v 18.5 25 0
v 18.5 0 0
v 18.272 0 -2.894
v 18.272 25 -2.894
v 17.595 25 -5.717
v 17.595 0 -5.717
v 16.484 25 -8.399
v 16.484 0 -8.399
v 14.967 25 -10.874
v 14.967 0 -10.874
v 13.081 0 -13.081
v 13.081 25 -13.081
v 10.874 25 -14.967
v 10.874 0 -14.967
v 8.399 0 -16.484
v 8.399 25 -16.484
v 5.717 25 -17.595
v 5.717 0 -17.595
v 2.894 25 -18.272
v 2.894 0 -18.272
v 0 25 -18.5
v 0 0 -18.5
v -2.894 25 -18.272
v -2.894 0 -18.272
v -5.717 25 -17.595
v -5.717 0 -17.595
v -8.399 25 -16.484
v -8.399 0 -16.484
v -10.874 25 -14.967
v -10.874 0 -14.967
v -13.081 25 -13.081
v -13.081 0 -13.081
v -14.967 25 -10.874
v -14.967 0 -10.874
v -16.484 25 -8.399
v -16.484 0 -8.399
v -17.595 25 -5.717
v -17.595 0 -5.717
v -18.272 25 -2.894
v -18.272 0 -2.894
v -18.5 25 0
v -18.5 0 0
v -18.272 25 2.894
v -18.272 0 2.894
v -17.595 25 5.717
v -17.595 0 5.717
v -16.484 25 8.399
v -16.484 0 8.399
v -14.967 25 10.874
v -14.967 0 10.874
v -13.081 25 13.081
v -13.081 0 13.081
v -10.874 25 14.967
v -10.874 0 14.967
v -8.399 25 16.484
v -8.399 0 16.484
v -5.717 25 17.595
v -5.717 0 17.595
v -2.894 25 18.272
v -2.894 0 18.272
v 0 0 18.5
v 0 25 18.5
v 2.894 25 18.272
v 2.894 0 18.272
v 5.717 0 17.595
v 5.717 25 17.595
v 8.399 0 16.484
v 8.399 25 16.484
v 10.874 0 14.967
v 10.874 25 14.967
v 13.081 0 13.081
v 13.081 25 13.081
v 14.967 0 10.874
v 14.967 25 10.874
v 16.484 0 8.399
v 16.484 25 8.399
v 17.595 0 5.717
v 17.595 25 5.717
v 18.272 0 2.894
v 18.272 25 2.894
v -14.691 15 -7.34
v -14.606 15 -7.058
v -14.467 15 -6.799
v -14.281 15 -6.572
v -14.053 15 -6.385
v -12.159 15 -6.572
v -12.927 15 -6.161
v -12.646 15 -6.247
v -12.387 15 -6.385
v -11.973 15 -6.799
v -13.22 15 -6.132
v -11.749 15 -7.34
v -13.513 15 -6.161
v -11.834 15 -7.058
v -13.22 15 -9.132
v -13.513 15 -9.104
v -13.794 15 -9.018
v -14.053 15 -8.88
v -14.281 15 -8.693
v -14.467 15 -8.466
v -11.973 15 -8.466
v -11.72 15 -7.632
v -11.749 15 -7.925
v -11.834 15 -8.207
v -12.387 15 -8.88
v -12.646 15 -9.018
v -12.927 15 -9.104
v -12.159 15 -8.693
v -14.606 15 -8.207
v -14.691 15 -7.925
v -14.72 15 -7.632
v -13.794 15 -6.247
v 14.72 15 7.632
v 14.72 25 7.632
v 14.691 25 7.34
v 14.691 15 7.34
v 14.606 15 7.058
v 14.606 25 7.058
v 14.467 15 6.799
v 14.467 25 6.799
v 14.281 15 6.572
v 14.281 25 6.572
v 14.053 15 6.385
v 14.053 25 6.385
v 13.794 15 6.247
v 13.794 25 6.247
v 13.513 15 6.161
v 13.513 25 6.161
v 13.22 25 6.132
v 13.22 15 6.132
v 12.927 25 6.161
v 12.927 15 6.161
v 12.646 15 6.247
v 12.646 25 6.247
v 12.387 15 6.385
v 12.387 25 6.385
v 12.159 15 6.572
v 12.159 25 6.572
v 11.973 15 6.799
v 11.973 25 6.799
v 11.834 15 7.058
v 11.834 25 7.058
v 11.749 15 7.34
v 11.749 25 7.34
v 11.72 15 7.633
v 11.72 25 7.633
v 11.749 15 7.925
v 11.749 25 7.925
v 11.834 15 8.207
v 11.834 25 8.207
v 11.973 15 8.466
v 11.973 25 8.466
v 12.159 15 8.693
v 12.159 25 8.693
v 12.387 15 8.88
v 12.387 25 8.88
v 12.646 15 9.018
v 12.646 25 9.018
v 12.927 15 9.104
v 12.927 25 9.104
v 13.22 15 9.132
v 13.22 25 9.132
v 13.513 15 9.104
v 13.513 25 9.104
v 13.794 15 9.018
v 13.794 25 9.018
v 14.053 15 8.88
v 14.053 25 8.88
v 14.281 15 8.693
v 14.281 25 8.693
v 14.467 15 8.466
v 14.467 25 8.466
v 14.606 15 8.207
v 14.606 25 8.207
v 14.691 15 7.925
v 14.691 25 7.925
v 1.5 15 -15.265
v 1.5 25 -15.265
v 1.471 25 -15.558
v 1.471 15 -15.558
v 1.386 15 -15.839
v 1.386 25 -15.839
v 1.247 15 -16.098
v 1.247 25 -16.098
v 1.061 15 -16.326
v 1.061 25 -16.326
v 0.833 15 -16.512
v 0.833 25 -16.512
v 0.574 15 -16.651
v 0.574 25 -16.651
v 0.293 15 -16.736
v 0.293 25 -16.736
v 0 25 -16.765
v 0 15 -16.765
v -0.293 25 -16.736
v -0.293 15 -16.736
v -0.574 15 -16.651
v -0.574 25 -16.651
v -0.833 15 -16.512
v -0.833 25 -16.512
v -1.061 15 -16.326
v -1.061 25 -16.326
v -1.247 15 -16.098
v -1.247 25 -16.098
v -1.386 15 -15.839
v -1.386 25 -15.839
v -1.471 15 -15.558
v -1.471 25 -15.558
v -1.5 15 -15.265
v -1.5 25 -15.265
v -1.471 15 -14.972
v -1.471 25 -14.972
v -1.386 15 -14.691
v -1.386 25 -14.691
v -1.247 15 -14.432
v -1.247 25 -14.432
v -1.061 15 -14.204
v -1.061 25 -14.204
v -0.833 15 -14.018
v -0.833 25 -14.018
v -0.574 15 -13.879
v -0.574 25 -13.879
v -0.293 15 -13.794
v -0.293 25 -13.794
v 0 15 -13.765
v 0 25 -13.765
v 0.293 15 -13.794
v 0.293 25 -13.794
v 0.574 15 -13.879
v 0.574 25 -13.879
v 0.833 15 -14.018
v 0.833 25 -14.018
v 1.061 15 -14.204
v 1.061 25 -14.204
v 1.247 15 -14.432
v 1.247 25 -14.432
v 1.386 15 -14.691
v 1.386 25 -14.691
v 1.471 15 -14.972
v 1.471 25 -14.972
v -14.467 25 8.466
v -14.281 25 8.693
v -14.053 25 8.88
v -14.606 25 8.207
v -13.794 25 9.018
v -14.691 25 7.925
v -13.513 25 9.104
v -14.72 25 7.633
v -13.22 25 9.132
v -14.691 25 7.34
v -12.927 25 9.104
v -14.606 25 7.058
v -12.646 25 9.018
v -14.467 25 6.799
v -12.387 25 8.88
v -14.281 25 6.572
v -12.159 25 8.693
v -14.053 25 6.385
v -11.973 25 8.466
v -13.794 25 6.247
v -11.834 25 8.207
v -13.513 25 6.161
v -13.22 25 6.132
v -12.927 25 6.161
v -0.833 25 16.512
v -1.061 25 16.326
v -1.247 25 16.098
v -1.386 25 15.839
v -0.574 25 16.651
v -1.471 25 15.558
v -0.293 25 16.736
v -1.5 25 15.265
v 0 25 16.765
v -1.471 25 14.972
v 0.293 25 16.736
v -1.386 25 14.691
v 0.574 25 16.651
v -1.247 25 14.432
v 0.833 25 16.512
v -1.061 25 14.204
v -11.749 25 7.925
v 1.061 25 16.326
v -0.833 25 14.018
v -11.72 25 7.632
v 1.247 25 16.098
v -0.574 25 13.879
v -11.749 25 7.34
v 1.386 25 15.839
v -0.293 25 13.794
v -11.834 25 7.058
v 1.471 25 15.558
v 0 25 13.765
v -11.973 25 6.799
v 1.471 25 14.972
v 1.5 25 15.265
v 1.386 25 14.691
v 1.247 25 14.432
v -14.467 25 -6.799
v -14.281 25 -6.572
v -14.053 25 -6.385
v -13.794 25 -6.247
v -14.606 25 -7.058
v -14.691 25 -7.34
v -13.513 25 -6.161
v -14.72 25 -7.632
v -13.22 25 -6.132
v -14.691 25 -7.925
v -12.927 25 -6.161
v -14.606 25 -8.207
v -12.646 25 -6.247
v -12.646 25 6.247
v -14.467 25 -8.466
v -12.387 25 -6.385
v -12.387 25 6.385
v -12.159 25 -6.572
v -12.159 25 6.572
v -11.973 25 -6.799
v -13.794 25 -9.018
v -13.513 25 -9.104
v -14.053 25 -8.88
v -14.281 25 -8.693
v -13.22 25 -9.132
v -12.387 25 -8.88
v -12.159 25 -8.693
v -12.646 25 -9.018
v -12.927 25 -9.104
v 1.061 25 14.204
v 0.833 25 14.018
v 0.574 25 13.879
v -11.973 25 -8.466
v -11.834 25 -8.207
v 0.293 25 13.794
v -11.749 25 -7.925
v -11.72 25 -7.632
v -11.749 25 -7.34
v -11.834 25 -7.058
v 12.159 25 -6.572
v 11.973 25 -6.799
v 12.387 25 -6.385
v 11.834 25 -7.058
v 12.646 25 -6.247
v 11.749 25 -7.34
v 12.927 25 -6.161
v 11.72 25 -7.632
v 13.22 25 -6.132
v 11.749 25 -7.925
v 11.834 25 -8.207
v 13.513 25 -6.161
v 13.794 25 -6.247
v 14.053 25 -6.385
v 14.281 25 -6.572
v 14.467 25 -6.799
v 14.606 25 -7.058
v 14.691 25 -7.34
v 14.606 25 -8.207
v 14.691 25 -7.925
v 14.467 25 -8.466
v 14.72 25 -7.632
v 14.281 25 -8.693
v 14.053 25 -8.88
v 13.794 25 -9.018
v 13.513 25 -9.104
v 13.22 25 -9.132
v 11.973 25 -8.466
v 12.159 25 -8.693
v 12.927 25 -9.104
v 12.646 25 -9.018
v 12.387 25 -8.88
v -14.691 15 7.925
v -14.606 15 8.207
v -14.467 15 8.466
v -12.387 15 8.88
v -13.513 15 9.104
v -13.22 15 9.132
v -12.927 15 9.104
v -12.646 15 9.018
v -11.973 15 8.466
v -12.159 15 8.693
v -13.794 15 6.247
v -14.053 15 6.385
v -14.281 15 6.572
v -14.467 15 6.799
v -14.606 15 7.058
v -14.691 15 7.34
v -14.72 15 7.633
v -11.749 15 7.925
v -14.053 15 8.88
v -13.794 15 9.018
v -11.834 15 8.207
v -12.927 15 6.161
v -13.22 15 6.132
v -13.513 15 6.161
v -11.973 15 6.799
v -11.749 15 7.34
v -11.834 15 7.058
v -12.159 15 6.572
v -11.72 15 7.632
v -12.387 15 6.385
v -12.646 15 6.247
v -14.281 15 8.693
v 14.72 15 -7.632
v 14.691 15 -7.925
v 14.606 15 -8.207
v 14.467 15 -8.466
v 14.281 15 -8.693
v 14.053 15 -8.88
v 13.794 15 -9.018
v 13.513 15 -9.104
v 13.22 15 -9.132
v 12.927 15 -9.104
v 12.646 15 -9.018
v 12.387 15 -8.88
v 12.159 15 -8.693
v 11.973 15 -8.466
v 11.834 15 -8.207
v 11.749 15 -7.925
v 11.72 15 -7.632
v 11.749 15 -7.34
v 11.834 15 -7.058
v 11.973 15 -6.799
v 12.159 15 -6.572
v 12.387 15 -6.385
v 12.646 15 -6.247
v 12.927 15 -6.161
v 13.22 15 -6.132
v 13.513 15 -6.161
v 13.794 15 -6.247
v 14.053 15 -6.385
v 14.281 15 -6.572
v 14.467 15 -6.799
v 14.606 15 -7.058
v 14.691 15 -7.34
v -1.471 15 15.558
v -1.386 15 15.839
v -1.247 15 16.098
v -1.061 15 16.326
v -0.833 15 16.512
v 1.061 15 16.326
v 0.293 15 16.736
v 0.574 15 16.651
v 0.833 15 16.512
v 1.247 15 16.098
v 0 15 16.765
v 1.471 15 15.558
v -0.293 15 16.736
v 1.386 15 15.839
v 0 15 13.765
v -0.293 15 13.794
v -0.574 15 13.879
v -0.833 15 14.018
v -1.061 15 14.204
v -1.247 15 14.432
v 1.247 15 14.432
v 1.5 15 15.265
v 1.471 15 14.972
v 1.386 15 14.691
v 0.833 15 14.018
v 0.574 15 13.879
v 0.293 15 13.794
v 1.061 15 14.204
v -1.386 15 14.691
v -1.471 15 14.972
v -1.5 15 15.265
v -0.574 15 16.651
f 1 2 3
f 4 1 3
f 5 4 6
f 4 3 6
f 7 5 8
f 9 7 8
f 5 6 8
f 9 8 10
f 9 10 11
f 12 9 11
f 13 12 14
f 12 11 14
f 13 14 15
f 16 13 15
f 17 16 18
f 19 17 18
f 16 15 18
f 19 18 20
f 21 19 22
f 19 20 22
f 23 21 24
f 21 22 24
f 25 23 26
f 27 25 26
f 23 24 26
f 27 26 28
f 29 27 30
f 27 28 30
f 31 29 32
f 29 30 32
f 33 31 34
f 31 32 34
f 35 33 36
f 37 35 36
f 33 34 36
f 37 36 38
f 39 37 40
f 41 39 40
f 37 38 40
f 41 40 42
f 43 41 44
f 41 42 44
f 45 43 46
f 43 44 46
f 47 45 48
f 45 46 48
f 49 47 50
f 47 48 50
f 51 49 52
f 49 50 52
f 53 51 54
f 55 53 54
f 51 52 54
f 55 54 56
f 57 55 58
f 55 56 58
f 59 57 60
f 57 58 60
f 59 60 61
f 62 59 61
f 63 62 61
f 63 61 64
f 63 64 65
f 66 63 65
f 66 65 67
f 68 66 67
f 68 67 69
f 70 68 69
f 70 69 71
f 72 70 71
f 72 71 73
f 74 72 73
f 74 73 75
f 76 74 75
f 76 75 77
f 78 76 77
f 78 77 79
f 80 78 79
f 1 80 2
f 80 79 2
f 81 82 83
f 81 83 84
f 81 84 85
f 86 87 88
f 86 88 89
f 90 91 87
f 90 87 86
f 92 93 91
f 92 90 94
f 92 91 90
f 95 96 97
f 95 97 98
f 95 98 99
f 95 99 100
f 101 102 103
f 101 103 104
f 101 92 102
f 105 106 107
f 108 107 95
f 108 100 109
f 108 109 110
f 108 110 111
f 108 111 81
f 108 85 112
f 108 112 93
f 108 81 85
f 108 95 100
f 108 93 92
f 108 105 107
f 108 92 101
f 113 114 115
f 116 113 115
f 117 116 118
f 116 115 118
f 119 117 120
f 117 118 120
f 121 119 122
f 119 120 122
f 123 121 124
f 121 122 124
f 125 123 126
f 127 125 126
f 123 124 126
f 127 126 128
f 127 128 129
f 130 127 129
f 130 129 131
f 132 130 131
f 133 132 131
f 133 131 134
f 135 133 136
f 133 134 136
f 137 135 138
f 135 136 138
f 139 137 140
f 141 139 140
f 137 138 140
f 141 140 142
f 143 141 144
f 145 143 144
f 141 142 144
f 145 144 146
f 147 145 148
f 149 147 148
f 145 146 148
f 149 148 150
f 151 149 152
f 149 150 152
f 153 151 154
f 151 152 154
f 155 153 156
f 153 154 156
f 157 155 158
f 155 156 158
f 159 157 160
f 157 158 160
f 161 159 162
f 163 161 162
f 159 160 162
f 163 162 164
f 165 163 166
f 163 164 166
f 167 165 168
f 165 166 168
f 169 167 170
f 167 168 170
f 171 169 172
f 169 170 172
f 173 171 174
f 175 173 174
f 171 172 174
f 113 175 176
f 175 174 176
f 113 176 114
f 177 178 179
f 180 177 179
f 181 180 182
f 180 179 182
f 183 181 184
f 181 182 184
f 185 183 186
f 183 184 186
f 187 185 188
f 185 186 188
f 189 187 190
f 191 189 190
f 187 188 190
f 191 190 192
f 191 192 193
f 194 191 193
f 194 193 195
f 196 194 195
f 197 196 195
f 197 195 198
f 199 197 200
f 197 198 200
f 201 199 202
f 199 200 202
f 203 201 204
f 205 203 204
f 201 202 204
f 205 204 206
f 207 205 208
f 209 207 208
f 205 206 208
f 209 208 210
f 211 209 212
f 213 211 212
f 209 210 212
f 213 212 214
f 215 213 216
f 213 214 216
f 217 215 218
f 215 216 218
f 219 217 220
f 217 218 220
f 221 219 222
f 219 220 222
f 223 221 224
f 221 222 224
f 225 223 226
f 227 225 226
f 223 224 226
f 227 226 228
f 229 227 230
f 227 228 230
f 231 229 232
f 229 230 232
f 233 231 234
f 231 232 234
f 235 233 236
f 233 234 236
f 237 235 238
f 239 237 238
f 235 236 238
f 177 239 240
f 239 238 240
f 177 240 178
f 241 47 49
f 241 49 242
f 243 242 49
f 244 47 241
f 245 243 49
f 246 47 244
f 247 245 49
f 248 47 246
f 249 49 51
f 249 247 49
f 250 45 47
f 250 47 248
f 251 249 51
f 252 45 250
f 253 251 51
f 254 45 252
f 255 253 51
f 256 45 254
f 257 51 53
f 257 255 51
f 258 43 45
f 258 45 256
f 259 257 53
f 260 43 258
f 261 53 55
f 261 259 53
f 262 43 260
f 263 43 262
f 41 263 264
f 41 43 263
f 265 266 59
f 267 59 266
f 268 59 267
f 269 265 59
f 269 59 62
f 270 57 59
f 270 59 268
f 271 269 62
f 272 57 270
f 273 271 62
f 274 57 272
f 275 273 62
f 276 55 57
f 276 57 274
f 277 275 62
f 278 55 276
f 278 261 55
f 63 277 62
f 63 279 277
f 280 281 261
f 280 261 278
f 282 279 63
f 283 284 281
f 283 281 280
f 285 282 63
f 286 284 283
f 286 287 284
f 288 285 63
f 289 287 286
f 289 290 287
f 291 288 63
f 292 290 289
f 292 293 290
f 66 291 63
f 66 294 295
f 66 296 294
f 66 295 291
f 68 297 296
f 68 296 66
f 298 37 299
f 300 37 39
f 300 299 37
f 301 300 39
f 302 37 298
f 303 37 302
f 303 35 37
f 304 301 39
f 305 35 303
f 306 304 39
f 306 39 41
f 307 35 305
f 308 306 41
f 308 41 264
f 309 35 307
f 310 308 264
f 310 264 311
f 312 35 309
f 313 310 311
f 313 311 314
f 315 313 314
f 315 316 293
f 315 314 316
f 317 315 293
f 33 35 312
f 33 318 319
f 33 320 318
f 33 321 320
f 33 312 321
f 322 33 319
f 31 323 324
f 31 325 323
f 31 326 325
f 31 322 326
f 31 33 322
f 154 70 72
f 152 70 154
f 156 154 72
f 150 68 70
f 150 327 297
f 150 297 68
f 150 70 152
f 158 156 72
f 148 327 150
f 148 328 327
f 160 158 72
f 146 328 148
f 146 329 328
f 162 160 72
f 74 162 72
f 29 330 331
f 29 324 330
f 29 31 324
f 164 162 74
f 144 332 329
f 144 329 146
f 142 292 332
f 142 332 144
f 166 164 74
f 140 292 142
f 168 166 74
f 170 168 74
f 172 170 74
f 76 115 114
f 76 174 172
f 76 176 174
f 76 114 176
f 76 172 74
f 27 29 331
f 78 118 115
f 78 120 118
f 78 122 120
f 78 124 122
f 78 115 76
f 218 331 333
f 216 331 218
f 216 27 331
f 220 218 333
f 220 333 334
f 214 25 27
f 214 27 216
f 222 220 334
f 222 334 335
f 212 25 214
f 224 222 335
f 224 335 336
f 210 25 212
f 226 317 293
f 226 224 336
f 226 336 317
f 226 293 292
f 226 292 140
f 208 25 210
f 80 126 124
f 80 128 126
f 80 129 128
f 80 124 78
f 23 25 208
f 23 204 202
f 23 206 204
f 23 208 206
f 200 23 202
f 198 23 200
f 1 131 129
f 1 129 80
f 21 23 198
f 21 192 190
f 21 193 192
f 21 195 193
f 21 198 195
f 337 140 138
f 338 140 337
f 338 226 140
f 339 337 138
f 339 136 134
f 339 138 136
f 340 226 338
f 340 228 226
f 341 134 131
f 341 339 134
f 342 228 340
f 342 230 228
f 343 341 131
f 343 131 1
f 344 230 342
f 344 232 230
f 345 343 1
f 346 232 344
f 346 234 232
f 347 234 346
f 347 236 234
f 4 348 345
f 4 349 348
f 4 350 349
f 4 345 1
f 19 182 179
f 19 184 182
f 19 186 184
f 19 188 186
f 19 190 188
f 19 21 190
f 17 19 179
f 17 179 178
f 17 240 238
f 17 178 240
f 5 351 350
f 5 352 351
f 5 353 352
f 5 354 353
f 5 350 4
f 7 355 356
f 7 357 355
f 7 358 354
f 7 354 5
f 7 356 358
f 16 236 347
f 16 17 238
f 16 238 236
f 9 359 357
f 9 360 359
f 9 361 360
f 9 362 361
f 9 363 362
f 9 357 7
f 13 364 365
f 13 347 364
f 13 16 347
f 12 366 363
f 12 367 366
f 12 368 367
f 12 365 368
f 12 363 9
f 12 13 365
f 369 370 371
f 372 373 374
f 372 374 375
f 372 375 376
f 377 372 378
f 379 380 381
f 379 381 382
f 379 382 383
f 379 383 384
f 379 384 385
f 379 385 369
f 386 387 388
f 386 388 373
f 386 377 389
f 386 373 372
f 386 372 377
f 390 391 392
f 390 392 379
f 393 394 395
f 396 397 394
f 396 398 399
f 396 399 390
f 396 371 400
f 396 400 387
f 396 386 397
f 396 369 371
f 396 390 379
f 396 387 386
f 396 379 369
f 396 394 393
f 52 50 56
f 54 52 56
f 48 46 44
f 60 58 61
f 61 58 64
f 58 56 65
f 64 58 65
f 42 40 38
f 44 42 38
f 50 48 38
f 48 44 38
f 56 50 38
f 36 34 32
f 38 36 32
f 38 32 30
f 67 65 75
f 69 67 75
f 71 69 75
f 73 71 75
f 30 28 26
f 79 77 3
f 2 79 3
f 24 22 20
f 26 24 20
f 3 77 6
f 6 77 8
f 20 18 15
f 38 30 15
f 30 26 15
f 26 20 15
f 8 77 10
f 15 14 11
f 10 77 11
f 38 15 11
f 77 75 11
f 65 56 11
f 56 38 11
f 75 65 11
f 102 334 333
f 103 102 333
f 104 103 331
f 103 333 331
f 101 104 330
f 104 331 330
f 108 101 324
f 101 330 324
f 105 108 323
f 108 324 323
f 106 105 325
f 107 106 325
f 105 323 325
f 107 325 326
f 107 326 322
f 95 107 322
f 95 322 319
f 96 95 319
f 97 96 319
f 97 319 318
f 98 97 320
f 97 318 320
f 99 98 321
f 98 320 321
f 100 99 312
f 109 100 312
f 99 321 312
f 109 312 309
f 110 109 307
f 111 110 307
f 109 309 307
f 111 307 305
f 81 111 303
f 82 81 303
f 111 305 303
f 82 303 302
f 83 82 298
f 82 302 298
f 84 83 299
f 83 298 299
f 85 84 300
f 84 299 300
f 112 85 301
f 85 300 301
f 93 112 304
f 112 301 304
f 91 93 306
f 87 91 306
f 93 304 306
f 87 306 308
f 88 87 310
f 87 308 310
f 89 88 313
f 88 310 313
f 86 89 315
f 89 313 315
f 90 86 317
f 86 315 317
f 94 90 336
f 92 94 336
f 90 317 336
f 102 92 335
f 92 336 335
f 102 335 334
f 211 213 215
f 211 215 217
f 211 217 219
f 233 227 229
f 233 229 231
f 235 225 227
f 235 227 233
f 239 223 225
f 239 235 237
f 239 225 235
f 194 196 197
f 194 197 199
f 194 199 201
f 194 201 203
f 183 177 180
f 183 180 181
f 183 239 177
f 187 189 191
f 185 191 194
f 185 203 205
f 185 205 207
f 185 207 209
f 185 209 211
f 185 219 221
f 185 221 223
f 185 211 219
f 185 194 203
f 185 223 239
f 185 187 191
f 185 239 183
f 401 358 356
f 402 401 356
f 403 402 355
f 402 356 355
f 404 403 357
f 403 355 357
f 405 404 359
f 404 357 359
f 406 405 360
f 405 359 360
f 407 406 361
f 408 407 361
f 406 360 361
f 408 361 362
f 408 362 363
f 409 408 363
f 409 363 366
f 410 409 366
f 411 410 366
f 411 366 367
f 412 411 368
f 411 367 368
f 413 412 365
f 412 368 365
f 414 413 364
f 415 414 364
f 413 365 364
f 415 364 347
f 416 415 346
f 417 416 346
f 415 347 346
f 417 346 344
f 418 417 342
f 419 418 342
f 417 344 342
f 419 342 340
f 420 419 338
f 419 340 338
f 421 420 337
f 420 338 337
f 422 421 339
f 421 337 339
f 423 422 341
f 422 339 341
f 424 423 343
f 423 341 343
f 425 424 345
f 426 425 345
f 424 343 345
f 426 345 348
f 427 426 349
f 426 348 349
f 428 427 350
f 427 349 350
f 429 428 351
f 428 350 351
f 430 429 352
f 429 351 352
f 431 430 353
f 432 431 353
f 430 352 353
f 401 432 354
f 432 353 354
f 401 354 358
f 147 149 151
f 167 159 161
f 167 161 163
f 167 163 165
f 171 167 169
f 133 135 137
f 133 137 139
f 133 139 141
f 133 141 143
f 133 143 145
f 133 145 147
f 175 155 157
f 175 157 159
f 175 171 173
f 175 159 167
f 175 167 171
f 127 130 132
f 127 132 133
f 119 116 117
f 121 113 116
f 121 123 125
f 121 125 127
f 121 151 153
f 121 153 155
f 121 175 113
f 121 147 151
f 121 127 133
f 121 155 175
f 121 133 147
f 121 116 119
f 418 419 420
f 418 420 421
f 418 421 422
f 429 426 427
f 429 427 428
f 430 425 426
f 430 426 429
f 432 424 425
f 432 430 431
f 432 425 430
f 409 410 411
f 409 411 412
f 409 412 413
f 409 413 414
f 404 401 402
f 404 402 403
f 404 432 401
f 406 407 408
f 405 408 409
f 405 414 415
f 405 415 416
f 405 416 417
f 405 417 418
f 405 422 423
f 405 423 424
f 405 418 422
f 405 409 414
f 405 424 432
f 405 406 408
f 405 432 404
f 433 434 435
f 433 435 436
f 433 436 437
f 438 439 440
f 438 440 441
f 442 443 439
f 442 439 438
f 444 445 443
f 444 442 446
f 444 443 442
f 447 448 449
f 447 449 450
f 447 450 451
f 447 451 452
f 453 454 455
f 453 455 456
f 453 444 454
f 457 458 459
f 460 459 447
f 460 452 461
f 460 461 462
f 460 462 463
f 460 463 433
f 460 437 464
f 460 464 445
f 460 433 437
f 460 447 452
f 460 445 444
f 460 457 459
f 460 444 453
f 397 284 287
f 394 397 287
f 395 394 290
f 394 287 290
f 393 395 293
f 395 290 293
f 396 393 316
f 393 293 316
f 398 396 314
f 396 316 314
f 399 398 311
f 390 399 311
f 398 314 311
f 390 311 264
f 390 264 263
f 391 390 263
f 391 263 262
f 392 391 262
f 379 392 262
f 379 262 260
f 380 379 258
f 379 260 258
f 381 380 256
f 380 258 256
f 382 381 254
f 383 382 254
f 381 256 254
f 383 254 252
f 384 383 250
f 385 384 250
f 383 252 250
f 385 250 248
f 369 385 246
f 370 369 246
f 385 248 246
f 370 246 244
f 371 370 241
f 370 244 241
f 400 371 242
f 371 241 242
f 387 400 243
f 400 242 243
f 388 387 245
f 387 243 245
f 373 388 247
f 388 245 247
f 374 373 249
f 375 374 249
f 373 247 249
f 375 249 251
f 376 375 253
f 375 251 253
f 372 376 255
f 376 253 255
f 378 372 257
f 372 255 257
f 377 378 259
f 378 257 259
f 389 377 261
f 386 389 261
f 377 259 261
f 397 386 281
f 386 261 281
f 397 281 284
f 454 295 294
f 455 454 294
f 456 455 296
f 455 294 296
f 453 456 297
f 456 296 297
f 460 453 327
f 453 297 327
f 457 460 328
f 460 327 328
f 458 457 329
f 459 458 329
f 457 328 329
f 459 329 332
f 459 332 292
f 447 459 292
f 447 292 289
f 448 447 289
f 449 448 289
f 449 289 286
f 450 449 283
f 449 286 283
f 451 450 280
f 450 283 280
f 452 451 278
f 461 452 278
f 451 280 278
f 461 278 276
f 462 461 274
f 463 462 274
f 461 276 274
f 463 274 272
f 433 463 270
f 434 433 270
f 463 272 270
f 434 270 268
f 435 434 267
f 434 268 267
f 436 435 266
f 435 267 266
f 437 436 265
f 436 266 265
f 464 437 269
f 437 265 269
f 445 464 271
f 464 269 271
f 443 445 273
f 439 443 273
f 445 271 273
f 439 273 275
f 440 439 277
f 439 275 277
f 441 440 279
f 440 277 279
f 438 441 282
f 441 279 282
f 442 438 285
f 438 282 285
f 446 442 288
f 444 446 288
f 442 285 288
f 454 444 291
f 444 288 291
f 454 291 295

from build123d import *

# Parameters (mm, degrees)
SKETCH1_R           = 18.5
BOSS_EXTRUDE1_DEPTH = 25
SKETCH2_R           = 1.5
CUT_EXTRUDE1_DEPTH  = 10


with BuildPart() as part:
    # Sketch1 → Boss-Extrude1 (new body)
    with BuildSketch(Plane(origin=(0, 0, 0), x_dir=(1, 0, 0), z_dir=(0, 1, 0))):
        Circle(SKETCH1_R)
    extrude(amount=BOSS_EXTRUDE1_DEPTH)

    # Sketch2 → Cut-Extrude1 (cut)
    with BuildSketch(Plane(origin=(0, 25, 0), x_dir=(1, 0, 0), z_dir=(0, 1, 0))):
        with Locations((0, 15.265)):
            Circle(SKETCH2_R)
        with Locations((13.219877789, 7.6325)):
            Circle(SKETCH2_R)
        with Locations((13.219877789, -7.6325)):
            Circle(SKETCH2_R)
        with Locations((0, -15.265)):
            Circle(SKETCH2_R)
        with Locations((-13.219877789, -7.6325)):
            Circle(SKETCH2_R)
        with Locations((-13.219877789, 7.6325)):
            Circle(SKETCH2_R)
    extrude(amount=-CUT_EXTRUDE1_DEPTH, mode=Mode.SUBTRACT)


solid = part.part
